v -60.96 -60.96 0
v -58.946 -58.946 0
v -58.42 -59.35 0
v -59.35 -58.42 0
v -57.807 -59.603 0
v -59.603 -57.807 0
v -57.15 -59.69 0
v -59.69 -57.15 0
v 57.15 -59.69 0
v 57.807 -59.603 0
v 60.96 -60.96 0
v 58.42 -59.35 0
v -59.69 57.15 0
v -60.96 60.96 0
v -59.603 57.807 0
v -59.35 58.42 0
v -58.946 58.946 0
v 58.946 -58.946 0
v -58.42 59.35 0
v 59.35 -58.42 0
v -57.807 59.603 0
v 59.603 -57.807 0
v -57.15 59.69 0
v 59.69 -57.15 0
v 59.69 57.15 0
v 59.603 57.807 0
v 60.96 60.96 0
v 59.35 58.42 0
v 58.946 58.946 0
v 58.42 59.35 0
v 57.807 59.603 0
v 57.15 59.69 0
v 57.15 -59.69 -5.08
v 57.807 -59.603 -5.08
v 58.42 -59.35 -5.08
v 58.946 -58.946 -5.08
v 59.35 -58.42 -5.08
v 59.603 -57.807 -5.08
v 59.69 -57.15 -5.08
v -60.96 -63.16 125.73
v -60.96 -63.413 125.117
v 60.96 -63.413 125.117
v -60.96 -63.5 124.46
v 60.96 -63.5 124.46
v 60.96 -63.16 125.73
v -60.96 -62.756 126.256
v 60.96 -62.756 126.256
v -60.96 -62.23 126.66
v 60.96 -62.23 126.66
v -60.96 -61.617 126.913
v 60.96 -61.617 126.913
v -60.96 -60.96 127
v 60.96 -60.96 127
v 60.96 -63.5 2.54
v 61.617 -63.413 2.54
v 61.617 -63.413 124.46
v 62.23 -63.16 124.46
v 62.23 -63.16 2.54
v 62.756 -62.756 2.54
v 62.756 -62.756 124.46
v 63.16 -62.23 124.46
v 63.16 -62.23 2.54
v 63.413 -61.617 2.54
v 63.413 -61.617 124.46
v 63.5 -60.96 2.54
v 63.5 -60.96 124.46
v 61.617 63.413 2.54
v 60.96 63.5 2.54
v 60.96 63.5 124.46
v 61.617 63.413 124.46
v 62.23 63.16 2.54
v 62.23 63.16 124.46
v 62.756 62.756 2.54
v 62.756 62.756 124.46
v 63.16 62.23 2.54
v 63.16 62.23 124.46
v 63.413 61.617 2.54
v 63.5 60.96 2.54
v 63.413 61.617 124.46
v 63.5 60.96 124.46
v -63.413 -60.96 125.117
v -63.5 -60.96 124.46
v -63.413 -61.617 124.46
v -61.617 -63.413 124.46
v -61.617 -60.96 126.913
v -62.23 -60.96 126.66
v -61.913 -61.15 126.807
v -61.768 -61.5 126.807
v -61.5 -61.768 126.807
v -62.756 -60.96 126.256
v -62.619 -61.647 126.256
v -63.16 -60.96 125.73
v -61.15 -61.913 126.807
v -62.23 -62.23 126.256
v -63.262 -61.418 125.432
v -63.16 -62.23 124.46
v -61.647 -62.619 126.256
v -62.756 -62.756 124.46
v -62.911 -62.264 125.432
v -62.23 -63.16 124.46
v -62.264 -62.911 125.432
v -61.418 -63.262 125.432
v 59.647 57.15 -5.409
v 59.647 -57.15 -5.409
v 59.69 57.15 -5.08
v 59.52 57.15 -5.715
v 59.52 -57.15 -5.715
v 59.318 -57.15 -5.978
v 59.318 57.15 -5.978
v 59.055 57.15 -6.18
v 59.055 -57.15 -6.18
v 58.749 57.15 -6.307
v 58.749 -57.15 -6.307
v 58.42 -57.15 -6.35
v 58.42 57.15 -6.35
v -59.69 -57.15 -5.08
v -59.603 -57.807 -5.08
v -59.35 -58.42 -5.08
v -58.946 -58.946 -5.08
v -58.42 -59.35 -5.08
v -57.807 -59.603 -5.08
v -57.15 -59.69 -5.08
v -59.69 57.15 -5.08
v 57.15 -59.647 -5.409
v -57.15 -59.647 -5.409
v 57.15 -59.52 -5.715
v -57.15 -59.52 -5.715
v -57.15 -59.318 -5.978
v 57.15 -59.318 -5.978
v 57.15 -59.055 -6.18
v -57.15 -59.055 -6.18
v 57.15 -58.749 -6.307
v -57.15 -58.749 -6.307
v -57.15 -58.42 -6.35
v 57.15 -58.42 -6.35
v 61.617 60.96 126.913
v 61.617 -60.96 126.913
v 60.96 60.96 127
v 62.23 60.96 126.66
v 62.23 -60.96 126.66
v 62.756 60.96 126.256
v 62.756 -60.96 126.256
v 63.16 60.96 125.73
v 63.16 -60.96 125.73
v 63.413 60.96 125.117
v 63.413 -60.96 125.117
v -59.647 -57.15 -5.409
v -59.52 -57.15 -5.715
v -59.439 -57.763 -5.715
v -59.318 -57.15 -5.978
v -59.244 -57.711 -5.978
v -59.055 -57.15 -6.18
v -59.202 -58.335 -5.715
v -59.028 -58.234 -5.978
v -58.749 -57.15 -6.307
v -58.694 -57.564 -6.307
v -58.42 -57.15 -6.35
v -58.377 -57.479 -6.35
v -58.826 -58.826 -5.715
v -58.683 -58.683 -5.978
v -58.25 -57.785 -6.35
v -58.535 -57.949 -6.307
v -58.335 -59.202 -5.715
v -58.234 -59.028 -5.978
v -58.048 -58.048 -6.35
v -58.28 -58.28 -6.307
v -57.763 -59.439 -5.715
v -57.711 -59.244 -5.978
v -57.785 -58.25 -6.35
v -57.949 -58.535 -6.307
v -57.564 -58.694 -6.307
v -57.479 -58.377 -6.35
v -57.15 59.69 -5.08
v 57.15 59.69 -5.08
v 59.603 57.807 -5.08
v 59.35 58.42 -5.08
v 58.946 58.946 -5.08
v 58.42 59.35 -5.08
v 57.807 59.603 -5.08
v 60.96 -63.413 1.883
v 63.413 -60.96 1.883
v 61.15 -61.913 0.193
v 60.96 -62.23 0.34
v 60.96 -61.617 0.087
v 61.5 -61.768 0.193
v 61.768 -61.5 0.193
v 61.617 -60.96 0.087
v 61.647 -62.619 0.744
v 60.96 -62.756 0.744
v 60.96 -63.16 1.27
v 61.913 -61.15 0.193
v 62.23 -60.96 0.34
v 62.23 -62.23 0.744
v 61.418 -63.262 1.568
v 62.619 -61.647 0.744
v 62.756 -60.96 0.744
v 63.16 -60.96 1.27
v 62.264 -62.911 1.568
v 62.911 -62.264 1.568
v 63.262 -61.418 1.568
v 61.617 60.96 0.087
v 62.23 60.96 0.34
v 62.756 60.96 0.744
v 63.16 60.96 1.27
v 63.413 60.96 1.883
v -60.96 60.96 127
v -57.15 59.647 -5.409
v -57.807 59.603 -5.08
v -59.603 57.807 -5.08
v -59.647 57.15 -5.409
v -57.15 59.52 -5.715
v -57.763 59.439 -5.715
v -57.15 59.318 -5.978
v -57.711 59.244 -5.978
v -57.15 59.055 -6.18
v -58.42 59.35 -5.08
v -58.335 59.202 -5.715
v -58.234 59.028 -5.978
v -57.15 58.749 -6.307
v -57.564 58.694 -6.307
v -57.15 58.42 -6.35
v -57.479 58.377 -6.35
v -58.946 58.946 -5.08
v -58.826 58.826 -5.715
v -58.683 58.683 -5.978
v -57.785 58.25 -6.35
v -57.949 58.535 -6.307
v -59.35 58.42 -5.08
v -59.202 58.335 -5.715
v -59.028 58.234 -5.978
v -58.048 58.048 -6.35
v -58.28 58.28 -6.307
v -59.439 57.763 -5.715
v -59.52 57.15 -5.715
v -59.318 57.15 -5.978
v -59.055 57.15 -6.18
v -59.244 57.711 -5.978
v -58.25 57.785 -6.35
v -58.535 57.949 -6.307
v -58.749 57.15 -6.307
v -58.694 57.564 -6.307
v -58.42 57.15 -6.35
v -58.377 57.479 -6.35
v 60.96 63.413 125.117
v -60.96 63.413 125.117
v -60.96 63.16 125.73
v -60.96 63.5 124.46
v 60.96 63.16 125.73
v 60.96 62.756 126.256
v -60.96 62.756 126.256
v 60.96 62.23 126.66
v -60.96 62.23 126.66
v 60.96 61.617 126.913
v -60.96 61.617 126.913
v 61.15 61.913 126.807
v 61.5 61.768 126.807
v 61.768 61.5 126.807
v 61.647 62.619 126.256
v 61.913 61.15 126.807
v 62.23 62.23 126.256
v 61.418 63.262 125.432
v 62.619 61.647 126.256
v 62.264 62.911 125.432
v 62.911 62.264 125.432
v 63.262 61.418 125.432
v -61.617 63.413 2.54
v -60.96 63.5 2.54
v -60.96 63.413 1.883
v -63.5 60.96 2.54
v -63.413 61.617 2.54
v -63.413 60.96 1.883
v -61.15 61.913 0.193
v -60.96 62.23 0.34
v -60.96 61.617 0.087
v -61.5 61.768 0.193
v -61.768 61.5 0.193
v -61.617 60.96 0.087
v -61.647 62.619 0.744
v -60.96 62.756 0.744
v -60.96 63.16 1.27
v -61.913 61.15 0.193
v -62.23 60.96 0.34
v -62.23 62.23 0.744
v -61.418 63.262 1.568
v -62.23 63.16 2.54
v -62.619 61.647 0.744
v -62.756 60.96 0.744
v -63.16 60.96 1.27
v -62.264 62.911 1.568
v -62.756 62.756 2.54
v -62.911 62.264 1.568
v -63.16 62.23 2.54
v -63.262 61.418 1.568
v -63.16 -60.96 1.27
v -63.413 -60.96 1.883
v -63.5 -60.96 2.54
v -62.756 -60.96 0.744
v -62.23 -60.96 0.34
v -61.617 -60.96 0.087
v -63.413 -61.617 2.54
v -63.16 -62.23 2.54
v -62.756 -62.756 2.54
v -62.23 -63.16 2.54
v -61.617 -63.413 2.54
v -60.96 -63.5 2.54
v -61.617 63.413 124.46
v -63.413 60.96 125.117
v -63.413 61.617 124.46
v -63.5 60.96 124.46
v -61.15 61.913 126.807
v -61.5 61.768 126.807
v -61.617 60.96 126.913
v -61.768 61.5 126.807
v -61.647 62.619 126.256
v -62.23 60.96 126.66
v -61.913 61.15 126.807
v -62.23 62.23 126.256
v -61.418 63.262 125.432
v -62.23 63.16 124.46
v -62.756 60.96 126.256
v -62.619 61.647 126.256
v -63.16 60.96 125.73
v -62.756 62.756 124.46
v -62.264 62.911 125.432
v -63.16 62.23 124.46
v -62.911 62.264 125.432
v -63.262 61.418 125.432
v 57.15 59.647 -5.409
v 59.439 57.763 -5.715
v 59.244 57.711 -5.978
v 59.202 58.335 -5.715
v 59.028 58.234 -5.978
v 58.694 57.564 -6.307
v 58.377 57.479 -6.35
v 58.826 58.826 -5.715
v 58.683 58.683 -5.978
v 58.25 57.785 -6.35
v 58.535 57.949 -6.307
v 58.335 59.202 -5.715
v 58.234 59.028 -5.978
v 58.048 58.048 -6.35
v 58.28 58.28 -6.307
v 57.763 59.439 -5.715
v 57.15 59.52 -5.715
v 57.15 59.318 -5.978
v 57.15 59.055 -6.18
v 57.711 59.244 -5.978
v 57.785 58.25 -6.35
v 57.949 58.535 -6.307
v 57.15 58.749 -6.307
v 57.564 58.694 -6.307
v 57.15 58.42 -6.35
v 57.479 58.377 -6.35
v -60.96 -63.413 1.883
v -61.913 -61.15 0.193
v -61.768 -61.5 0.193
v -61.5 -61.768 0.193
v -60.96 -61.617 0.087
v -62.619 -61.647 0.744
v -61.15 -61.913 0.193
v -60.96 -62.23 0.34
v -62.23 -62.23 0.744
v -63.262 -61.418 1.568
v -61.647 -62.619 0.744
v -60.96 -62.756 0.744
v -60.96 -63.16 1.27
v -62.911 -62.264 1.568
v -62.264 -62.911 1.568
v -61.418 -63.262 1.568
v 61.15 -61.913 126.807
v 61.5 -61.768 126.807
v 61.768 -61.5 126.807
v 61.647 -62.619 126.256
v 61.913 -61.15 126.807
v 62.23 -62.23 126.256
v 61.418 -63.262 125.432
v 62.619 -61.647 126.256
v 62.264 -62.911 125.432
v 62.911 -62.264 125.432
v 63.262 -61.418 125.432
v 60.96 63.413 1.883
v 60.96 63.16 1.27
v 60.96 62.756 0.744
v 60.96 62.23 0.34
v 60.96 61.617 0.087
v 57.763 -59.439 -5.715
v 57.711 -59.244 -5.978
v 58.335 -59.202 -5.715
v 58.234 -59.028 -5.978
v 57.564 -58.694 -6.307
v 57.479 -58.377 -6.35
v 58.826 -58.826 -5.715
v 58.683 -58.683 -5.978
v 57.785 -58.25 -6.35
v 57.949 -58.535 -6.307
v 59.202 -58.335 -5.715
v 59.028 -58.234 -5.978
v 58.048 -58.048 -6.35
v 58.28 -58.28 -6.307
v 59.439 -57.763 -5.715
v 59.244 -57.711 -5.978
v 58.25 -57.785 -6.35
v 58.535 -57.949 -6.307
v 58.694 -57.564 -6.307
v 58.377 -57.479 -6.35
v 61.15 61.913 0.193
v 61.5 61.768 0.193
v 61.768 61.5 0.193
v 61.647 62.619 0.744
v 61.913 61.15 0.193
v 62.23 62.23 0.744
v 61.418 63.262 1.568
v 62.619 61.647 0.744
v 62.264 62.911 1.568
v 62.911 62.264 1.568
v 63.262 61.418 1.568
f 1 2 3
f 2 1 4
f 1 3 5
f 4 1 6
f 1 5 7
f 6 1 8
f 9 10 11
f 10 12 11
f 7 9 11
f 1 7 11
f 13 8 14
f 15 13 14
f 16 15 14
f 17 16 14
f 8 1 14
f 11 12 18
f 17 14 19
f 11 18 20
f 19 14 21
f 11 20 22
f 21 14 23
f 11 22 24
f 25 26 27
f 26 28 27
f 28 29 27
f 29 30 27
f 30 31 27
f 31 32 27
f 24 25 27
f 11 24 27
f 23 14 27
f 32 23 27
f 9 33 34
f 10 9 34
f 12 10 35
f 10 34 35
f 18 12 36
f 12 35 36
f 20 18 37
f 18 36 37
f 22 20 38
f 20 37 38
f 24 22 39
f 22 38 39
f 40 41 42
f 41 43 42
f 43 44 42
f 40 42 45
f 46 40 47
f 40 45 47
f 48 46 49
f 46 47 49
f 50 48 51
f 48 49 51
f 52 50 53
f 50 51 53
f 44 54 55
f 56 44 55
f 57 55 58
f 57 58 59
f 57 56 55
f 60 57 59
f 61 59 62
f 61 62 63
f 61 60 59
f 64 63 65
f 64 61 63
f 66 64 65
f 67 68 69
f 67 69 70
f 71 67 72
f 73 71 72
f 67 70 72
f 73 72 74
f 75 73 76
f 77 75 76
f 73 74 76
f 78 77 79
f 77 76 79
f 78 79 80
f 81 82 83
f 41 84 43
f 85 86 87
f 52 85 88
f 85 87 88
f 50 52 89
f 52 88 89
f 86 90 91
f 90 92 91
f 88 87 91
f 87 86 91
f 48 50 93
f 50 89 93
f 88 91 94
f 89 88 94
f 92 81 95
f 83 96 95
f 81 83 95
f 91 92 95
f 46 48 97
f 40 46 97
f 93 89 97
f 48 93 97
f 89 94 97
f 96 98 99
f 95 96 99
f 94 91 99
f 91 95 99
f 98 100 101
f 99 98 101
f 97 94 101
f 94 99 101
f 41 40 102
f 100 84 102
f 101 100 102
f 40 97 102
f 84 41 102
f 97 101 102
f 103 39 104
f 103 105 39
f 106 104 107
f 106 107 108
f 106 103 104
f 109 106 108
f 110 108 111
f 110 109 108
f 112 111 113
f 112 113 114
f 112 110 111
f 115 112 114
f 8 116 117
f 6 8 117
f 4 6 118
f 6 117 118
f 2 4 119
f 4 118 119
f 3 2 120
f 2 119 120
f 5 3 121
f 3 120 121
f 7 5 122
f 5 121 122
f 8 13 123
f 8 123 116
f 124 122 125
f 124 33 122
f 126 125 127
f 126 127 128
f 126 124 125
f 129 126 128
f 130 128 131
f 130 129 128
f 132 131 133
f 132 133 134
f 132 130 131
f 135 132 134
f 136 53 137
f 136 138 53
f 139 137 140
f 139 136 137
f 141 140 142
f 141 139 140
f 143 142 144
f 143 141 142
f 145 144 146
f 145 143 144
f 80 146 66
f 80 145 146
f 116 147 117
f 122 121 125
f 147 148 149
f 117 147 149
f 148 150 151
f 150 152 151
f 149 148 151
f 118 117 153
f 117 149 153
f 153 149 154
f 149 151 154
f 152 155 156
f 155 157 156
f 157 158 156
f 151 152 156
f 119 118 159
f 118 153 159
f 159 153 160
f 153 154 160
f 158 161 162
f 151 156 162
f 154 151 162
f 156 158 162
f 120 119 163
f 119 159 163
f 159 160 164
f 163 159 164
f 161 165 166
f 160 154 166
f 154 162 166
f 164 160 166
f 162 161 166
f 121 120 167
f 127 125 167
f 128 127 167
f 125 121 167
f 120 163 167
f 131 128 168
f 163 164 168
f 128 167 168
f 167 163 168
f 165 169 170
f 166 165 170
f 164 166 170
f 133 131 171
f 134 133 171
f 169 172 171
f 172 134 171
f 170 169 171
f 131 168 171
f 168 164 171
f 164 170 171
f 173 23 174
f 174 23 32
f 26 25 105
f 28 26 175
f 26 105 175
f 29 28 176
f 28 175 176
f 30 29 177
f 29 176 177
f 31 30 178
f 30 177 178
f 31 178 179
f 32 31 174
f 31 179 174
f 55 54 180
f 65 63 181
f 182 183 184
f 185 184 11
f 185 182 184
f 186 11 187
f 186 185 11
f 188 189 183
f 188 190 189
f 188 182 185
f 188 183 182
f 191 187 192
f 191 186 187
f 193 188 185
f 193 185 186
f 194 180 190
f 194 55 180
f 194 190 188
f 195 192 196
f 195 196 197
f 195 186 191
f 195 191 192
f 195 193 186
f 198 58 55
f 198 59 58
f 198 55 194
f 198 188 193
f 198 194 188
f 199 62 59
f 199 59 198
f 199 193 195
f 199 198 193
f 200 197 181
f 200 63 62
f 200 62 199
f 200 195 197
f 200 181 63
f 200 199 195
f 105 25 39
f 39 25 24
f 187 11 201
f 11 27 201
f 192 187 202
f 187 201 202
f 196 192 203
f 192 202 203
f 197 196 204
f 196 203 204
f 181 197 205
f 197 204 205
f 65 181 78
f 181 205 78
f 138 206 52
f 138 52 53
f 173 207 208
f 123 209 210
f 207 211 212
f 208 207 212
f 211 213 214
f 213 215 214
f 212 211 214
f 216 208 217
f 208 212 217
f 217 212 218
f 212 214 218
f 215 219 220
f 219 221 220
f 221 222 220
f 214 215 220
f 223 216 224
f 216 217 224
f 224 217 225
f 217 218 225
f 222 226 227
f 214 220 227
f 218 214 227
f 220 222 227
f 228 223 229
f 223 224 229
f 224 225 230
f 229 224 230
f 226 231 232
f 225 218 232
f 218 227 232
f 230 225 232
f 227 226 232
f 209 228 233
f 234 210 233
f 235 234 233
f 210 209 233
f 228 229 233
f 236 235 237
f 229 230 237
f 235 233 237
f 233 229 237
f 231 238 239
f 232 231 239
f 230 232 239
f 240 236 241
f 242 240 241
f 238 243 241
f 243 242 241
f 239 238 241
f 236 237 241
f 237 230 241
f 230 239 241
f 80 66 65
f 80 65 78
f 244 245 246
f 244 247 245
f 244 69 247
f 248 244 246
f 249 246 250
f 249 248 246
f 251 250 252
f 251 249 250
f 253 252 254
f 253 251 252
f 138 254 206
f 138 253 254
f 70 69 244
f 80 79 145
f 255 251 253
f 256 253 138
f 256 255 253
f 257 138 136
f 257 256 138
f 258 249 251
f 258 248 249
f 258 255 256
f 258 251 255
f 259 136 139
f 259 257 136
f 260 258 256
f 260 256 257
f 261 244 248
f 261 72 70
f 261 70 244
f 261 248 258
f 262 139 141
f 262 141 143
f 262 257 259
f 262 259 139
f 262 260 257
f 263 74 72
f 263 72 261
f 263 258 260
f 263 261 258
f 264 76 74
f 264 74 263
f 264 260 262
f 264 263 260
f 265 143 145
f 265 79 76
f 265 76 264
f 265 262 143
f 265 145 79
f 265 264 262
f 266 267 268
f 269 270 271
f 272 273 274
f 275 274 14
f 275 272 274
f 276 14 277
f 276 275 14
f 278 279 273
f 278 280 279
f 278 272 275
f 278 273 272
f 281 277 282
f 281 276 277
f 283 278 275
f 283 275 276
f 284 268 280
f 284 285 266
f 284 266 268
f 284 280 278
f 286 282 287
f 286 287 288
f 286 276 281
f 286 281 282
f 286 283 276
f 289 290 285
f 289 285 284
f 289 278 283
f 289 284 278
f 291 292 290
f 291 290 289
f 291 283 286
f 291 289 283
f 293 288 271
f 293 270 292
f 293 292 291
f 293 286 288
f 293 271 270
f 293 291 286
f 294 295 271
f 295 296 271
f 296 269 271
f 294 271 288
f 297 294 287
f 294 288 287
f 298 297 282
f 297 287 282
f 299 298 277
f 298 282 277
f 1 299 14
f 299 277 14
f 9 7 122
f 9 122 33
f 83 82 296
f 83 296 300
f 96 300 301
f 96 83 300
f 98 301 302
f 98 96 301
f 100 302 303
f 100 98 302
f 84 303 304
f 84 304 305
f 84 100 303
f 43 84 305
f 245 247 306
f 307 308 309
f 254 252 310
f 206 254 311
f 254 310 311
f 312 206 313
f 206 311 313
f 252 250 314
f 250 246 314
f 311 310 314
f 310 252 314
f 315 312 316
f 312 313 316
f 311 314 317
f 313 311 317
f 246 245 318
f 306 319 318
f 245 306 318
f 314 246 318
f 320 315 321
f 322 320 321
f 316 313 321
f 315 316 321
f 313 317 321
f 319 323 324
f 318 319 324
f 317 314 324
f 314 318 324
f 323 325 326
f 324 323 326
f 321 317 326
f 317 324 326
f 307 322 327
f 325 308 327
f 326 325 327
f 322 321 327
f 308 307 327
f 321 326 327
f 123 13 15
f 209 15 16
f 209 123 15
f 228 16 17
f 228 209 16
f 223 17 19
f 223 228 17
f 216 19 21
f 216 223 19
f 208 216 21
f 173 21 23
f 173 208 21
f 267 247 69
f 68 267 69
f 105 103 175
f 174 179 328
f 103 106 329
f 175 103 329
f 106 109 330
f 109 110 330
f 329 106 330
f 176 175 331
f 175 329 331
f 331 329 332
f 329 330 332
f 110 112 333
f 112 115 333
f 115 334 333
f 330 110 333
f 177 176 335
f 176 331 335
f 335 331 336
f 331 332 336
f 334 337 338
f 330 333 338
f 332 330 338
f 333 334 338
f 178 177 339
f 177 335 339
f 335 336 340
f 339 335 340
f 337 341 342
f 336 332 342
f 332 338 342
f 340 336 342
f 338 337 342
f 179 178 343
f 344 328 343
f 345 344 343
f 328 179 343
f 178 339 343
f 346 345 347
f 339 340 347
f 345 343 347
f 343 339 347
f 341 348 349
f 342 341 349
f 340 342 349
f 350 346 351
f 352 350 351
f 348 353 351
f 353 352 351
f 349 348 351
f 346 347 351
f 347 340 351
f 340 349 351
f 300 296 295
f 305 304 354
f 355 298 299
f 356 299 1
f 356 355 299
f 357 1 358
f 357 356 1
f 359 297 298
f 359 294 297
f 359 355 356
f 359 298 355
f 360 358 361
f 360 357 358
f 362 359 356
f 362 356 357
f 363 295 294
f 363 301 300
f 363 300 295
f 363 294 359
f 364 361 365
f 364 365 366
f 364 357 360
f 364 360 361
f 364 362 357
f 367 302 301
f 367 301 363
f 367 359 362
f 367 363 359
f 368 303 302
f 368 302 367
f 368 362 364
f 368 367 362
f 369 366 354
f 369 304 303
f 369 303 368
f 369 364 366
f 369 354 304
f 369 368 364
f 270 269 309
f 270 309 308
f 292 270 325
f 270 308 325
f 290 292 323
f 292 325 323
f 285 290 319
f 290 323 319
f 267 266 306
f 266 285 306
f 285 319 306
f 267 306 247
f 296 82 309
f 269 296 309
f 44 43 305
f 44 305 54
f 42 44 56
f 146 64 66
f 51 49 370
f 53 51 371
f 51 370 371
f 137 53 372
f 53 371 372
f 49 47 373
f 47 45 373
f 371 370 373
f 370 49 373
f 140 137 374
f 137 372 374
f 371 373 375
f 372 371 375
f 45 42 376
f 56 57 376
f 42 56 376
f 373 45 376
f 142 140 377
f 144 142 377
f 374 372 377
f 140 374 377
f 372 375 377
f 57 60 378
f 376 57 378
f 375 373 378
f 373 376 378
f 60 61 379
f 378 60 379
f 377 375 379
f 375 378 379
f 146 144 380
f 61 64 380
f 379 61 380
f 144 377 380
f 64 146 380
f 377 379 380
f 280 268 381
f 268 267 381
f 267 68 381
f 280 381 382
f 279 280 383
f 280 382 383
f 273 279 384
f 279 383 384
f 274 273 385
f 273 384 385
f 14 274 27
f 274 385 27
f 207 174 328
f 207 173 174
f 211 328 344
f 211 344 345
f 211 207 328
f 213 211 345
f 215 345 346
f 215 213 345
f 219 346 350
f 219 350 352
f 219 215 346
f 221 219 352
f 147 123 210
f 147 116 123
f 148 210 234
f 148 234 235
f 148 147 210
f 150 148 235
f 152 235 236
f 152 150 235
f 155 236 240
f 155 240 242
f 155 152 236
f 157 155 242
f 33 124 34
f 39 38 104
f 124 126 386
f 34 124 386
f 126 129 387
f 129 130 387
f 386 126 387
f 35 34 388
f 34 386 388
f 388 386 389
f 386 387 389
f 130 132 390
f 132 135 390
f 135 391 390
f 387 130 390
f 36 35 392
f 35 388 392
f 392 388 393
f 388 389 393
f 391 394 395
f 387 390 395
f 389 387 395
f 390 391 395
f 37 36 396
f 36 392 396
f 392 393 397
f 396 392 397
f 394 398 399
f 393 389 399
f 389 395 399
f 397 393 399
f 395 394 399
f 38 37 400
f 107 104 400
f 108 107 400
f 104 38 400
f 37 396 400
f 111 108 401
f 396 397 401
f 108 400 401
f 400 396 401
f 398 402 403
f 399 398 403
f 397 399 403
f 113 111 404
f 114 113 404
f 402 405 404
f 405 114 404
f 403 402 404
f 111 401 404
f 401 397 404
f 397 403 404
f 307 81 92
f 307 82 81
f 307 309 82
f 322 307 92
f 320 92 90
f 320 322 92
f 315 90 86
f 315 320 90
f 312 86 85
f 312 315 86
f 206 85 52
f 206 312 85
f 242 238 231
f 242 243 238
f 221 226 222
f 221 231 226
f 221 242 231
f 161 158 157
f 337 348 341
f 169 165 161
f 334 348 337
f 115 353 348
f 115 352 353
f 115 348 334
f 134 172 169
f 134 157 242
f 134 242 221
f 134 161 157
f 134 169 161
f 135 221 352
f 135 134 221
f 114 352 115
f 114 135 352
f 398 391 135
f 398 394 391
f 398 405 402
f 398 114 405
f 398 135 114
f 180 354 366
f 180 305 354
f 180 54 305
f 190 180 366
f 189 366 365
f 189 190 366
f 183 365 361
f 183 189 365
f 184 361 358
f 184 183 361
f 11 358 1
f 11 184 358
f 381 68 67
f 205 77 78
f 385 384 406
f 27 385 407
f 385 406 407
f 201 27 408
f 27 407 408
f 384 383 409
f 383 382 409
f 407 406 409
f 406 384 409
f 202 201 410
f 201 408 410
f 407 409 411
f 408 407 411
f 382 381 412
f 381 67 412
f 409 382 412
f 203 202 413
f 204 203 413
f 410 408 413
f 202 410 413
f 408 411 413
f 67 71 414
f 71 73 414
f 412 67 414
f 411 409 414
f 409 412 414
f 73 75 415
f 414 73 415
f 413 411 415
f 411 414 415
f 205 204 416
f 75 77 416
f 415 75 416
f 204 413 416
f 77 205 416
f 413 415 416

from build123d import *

# Parameters (mm, degrees)
F0_W     = 127
F0_H     = 127
F1_DEPTH = 127
F2_W     = 119.38
F2_H     = 119.38
F3_DEPTH = 6.35
F4_R     = 2.54
F5_R     = 2.54
F6_R     = 1.27


with BuildPart() as f1:
    # F0 (on Top) → F1 (new body)
    with BuildSketch(Plane.XY):
        Rectangle(F0_W, F0_H)
    extrude(amount=F1_DEPTH)

    # F2 (on face) → F3 (join)
    with BuildSketch(Plane(origin=(0, 0, 0), x_dir=(1, 0, 0), z_dir=(0, 0, -1))):
        Rectangle(F2_W, F2_H)
    extrude(amount=F3_DEPTH)

    # F4
    f4_edges = [f1.edges().sort_by_distance(p)[0] for p in [
        (63.5, 63.5, 63.5),
        (-63.5, 63.5, 63.5),
        (0, 63.5, 0),
        (0, 63.5, 127),
        (-63.5, -63.5, 63.5),
        (-63.5, 0, 0),
        (-63.5, 0, 127),
        (63.5, -63.5, 63.5),
        (0, -63.5, 0),
        (0, -63.5, 127),
        (63.5, 0, 0),
        (63.5, 0, 127),
    ]]
    fillet(f4_edges, radius=F4_R)

    # F5
    f5_edges = [f1.edges().sort_by_distance(p)[0] for p in [
        (59.69, -59.69, -3.175),
        (-59.69, -59.69, -3.175),
        (59.69, 59.69, -3.175),
        (-59.69, 59.69, -3.175),
    ]]
    fillet(f5_edges, radius=F5_R)

    # F6
    f6_edges = [f1.edges().sort_by_distance(p)[0] for p in [
        (0, -59.69, -6.35),
        (58.946051, -58.946051, -6.35),
        (-58.946051, -58.946051, -6.35),
        (59.69, 0, -6.35),
        (-59.69, 0, -6.35),
        (58.946051, 58.946051, -6.35),
        (-58.946051, 58.946051, -6.35),
        (0, 59.69, -6.35),
    ]]
    fillet(f6_edges, radius=F6_R)


solid = f1.part
